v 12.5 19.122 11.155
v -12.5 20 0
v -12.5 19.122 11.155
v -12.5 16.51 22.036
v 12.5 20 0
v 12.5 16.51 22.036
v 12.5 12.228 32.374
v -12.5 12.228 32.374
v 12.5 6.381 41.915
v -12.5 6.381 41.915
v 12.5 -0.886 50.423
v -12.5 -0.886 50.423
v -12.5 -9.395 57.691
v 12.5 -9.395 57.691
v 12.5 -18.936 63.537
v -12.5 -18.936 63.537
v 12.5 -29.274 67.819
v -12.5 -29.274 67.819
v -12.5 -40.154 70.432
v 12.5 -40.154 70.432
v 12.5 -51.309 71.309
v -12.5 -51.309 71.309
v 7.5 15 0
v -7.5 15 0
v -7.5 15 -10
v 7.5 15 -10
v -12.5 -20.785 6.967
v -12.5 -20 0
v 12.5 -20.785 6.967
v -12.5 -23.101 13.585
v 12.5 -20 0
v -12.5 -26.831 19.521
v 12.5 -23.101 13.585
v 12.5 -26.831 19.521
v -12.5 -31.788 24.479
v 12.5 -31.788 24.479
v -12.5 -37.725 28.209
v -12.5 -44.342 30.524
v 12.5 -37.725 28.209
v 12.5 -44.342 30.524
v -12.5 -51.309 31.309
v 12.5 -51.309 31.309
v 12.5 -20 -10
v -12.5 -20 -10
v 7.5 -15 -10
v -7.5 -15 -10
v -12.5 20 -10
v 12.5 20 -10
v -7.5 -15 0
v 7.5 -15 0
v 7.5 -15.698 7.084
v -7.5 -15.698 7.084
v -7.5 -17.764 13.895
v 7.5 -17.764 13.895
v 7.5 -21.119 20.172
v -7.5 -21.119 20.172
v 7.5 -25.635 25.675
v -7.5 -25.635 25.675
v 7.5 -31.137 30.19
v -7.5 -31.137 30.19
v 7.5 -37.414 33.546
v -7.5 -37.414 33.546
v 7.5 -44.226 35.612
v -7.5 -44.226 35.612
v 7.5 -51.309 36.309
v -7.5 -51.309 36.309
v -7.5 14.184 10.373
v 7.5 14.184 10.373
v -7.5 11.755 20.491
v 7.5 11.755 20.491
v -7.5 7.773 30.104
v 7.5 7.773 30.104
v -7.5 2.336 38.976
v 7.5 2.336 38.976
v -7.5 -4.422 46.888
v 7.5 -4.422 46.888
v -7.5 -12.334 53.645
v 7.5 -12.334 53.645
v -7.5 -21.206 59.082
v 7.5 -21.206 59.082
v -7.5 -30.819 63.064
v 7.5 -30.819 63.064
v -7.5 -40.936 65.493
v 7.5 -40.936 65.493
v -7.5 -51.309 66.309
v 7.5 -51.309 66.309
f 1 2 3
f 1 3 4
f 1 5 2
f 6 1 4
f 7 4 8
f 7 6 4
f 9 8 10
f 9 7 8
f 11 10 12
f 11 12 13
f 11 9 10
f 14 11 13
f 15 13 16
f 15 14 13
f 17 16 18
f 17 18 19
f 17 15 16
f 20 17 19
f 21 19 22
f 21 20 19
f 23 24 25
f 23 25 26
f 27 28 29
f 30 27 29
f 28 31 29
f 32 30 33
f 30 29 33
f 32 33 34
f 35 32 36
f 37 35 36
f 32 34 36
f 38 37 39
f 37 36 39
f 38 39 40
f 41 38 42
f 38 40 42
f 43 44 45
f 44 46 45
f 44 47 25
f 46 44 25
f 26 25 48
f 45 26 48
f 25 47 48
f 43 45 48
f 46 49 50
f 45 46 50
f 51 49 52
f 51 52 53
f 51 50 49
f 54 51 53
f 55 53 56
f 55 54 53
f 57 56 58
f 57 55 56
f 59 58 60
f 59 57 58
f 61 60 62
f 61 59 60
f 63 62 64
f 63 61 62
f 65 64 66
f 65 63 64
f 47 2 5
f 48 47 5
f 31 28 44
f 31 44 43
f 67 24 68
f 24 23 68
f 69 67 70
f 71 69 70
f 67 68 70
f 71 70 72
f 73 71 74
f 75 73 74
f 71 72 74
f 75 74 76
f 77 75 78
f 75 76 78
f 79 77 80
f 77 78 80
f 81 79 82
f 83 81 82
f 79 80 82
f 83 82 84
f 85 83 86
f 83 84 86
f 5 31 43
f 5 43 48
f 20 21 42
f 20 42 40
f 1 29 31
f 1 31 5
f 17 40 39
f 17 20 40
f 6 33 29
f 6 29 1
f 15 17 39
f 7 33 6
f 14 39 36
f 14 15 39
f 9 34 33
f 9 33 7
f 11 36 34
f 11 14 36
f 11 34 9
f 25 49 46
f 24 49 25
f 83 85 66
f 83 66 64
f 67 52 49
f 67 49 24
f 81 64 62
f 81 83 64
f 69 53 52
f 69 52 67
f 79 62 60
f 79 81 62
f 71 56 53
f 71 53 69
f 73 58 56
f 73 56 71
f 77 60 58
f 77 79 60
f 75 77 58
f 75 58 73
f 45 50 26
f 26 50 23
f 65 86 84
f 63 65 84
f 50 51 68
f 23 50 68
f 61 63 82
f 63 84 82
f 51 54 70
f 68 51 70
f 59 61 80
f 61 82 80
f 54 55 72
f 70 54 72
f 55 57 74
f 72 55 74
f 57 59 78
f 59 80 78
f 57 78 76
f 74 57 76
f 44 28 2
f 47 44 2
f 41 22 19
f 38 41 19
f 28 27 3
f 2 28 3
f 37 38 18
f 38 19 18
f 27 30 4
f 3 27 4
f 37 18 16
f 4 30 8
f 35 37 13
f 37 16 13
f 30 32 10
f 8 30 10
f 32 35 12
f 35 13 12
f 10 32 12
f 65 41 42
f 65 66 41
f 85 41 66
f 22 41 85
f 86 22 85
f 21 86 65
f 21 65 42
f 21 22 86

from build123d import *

# Parameters (mm, degrees)
F0_W     = 25
F0_H     = 40
F2_ANGLE = 90
F1_W     = 15
F1_H     = 30
F3_ANGLE = 90
F4_DEPTH = 10
F5_DEPTH = 10


with BuildPart() as f2:
    # F0 (on Top) → F2 (revolve)
    with BuildSketch(Plane.XY):
        Rectangle(F0_W, F0_H)
    revolve(axis=Axis((-1.096226, -51.309453, 0), (1, 0, 0)), revolution_arc=F2_ANGLE)

    # F1 (on Top) → F3 (revolve, cut)
    with BuildSketch(Plane.XY):
        Rectangle(F1_W, F1_H)
    revolve(axis=Axis((-1.096226, -51.309453, 0), (1, 0, 0)), revolution_arc=F3_ANGLE, mode=Mode.SUBTRACT)

    # F0 (on Top) → F4 (join)
    with BuildSketch(Plane.XY):
        Rectangle(F0_W, F0_H)
    extrude(amount=-F4_DEPTH)

    # F1 (on Top) → F5 (cut)
    with BuildSketch(Plane.XY):
        Rectangle(F1_W, F1_H)
    extrude(amount=-F5_DEPTH, mode=Mode.SUBTRACT)


solid = f2.part
